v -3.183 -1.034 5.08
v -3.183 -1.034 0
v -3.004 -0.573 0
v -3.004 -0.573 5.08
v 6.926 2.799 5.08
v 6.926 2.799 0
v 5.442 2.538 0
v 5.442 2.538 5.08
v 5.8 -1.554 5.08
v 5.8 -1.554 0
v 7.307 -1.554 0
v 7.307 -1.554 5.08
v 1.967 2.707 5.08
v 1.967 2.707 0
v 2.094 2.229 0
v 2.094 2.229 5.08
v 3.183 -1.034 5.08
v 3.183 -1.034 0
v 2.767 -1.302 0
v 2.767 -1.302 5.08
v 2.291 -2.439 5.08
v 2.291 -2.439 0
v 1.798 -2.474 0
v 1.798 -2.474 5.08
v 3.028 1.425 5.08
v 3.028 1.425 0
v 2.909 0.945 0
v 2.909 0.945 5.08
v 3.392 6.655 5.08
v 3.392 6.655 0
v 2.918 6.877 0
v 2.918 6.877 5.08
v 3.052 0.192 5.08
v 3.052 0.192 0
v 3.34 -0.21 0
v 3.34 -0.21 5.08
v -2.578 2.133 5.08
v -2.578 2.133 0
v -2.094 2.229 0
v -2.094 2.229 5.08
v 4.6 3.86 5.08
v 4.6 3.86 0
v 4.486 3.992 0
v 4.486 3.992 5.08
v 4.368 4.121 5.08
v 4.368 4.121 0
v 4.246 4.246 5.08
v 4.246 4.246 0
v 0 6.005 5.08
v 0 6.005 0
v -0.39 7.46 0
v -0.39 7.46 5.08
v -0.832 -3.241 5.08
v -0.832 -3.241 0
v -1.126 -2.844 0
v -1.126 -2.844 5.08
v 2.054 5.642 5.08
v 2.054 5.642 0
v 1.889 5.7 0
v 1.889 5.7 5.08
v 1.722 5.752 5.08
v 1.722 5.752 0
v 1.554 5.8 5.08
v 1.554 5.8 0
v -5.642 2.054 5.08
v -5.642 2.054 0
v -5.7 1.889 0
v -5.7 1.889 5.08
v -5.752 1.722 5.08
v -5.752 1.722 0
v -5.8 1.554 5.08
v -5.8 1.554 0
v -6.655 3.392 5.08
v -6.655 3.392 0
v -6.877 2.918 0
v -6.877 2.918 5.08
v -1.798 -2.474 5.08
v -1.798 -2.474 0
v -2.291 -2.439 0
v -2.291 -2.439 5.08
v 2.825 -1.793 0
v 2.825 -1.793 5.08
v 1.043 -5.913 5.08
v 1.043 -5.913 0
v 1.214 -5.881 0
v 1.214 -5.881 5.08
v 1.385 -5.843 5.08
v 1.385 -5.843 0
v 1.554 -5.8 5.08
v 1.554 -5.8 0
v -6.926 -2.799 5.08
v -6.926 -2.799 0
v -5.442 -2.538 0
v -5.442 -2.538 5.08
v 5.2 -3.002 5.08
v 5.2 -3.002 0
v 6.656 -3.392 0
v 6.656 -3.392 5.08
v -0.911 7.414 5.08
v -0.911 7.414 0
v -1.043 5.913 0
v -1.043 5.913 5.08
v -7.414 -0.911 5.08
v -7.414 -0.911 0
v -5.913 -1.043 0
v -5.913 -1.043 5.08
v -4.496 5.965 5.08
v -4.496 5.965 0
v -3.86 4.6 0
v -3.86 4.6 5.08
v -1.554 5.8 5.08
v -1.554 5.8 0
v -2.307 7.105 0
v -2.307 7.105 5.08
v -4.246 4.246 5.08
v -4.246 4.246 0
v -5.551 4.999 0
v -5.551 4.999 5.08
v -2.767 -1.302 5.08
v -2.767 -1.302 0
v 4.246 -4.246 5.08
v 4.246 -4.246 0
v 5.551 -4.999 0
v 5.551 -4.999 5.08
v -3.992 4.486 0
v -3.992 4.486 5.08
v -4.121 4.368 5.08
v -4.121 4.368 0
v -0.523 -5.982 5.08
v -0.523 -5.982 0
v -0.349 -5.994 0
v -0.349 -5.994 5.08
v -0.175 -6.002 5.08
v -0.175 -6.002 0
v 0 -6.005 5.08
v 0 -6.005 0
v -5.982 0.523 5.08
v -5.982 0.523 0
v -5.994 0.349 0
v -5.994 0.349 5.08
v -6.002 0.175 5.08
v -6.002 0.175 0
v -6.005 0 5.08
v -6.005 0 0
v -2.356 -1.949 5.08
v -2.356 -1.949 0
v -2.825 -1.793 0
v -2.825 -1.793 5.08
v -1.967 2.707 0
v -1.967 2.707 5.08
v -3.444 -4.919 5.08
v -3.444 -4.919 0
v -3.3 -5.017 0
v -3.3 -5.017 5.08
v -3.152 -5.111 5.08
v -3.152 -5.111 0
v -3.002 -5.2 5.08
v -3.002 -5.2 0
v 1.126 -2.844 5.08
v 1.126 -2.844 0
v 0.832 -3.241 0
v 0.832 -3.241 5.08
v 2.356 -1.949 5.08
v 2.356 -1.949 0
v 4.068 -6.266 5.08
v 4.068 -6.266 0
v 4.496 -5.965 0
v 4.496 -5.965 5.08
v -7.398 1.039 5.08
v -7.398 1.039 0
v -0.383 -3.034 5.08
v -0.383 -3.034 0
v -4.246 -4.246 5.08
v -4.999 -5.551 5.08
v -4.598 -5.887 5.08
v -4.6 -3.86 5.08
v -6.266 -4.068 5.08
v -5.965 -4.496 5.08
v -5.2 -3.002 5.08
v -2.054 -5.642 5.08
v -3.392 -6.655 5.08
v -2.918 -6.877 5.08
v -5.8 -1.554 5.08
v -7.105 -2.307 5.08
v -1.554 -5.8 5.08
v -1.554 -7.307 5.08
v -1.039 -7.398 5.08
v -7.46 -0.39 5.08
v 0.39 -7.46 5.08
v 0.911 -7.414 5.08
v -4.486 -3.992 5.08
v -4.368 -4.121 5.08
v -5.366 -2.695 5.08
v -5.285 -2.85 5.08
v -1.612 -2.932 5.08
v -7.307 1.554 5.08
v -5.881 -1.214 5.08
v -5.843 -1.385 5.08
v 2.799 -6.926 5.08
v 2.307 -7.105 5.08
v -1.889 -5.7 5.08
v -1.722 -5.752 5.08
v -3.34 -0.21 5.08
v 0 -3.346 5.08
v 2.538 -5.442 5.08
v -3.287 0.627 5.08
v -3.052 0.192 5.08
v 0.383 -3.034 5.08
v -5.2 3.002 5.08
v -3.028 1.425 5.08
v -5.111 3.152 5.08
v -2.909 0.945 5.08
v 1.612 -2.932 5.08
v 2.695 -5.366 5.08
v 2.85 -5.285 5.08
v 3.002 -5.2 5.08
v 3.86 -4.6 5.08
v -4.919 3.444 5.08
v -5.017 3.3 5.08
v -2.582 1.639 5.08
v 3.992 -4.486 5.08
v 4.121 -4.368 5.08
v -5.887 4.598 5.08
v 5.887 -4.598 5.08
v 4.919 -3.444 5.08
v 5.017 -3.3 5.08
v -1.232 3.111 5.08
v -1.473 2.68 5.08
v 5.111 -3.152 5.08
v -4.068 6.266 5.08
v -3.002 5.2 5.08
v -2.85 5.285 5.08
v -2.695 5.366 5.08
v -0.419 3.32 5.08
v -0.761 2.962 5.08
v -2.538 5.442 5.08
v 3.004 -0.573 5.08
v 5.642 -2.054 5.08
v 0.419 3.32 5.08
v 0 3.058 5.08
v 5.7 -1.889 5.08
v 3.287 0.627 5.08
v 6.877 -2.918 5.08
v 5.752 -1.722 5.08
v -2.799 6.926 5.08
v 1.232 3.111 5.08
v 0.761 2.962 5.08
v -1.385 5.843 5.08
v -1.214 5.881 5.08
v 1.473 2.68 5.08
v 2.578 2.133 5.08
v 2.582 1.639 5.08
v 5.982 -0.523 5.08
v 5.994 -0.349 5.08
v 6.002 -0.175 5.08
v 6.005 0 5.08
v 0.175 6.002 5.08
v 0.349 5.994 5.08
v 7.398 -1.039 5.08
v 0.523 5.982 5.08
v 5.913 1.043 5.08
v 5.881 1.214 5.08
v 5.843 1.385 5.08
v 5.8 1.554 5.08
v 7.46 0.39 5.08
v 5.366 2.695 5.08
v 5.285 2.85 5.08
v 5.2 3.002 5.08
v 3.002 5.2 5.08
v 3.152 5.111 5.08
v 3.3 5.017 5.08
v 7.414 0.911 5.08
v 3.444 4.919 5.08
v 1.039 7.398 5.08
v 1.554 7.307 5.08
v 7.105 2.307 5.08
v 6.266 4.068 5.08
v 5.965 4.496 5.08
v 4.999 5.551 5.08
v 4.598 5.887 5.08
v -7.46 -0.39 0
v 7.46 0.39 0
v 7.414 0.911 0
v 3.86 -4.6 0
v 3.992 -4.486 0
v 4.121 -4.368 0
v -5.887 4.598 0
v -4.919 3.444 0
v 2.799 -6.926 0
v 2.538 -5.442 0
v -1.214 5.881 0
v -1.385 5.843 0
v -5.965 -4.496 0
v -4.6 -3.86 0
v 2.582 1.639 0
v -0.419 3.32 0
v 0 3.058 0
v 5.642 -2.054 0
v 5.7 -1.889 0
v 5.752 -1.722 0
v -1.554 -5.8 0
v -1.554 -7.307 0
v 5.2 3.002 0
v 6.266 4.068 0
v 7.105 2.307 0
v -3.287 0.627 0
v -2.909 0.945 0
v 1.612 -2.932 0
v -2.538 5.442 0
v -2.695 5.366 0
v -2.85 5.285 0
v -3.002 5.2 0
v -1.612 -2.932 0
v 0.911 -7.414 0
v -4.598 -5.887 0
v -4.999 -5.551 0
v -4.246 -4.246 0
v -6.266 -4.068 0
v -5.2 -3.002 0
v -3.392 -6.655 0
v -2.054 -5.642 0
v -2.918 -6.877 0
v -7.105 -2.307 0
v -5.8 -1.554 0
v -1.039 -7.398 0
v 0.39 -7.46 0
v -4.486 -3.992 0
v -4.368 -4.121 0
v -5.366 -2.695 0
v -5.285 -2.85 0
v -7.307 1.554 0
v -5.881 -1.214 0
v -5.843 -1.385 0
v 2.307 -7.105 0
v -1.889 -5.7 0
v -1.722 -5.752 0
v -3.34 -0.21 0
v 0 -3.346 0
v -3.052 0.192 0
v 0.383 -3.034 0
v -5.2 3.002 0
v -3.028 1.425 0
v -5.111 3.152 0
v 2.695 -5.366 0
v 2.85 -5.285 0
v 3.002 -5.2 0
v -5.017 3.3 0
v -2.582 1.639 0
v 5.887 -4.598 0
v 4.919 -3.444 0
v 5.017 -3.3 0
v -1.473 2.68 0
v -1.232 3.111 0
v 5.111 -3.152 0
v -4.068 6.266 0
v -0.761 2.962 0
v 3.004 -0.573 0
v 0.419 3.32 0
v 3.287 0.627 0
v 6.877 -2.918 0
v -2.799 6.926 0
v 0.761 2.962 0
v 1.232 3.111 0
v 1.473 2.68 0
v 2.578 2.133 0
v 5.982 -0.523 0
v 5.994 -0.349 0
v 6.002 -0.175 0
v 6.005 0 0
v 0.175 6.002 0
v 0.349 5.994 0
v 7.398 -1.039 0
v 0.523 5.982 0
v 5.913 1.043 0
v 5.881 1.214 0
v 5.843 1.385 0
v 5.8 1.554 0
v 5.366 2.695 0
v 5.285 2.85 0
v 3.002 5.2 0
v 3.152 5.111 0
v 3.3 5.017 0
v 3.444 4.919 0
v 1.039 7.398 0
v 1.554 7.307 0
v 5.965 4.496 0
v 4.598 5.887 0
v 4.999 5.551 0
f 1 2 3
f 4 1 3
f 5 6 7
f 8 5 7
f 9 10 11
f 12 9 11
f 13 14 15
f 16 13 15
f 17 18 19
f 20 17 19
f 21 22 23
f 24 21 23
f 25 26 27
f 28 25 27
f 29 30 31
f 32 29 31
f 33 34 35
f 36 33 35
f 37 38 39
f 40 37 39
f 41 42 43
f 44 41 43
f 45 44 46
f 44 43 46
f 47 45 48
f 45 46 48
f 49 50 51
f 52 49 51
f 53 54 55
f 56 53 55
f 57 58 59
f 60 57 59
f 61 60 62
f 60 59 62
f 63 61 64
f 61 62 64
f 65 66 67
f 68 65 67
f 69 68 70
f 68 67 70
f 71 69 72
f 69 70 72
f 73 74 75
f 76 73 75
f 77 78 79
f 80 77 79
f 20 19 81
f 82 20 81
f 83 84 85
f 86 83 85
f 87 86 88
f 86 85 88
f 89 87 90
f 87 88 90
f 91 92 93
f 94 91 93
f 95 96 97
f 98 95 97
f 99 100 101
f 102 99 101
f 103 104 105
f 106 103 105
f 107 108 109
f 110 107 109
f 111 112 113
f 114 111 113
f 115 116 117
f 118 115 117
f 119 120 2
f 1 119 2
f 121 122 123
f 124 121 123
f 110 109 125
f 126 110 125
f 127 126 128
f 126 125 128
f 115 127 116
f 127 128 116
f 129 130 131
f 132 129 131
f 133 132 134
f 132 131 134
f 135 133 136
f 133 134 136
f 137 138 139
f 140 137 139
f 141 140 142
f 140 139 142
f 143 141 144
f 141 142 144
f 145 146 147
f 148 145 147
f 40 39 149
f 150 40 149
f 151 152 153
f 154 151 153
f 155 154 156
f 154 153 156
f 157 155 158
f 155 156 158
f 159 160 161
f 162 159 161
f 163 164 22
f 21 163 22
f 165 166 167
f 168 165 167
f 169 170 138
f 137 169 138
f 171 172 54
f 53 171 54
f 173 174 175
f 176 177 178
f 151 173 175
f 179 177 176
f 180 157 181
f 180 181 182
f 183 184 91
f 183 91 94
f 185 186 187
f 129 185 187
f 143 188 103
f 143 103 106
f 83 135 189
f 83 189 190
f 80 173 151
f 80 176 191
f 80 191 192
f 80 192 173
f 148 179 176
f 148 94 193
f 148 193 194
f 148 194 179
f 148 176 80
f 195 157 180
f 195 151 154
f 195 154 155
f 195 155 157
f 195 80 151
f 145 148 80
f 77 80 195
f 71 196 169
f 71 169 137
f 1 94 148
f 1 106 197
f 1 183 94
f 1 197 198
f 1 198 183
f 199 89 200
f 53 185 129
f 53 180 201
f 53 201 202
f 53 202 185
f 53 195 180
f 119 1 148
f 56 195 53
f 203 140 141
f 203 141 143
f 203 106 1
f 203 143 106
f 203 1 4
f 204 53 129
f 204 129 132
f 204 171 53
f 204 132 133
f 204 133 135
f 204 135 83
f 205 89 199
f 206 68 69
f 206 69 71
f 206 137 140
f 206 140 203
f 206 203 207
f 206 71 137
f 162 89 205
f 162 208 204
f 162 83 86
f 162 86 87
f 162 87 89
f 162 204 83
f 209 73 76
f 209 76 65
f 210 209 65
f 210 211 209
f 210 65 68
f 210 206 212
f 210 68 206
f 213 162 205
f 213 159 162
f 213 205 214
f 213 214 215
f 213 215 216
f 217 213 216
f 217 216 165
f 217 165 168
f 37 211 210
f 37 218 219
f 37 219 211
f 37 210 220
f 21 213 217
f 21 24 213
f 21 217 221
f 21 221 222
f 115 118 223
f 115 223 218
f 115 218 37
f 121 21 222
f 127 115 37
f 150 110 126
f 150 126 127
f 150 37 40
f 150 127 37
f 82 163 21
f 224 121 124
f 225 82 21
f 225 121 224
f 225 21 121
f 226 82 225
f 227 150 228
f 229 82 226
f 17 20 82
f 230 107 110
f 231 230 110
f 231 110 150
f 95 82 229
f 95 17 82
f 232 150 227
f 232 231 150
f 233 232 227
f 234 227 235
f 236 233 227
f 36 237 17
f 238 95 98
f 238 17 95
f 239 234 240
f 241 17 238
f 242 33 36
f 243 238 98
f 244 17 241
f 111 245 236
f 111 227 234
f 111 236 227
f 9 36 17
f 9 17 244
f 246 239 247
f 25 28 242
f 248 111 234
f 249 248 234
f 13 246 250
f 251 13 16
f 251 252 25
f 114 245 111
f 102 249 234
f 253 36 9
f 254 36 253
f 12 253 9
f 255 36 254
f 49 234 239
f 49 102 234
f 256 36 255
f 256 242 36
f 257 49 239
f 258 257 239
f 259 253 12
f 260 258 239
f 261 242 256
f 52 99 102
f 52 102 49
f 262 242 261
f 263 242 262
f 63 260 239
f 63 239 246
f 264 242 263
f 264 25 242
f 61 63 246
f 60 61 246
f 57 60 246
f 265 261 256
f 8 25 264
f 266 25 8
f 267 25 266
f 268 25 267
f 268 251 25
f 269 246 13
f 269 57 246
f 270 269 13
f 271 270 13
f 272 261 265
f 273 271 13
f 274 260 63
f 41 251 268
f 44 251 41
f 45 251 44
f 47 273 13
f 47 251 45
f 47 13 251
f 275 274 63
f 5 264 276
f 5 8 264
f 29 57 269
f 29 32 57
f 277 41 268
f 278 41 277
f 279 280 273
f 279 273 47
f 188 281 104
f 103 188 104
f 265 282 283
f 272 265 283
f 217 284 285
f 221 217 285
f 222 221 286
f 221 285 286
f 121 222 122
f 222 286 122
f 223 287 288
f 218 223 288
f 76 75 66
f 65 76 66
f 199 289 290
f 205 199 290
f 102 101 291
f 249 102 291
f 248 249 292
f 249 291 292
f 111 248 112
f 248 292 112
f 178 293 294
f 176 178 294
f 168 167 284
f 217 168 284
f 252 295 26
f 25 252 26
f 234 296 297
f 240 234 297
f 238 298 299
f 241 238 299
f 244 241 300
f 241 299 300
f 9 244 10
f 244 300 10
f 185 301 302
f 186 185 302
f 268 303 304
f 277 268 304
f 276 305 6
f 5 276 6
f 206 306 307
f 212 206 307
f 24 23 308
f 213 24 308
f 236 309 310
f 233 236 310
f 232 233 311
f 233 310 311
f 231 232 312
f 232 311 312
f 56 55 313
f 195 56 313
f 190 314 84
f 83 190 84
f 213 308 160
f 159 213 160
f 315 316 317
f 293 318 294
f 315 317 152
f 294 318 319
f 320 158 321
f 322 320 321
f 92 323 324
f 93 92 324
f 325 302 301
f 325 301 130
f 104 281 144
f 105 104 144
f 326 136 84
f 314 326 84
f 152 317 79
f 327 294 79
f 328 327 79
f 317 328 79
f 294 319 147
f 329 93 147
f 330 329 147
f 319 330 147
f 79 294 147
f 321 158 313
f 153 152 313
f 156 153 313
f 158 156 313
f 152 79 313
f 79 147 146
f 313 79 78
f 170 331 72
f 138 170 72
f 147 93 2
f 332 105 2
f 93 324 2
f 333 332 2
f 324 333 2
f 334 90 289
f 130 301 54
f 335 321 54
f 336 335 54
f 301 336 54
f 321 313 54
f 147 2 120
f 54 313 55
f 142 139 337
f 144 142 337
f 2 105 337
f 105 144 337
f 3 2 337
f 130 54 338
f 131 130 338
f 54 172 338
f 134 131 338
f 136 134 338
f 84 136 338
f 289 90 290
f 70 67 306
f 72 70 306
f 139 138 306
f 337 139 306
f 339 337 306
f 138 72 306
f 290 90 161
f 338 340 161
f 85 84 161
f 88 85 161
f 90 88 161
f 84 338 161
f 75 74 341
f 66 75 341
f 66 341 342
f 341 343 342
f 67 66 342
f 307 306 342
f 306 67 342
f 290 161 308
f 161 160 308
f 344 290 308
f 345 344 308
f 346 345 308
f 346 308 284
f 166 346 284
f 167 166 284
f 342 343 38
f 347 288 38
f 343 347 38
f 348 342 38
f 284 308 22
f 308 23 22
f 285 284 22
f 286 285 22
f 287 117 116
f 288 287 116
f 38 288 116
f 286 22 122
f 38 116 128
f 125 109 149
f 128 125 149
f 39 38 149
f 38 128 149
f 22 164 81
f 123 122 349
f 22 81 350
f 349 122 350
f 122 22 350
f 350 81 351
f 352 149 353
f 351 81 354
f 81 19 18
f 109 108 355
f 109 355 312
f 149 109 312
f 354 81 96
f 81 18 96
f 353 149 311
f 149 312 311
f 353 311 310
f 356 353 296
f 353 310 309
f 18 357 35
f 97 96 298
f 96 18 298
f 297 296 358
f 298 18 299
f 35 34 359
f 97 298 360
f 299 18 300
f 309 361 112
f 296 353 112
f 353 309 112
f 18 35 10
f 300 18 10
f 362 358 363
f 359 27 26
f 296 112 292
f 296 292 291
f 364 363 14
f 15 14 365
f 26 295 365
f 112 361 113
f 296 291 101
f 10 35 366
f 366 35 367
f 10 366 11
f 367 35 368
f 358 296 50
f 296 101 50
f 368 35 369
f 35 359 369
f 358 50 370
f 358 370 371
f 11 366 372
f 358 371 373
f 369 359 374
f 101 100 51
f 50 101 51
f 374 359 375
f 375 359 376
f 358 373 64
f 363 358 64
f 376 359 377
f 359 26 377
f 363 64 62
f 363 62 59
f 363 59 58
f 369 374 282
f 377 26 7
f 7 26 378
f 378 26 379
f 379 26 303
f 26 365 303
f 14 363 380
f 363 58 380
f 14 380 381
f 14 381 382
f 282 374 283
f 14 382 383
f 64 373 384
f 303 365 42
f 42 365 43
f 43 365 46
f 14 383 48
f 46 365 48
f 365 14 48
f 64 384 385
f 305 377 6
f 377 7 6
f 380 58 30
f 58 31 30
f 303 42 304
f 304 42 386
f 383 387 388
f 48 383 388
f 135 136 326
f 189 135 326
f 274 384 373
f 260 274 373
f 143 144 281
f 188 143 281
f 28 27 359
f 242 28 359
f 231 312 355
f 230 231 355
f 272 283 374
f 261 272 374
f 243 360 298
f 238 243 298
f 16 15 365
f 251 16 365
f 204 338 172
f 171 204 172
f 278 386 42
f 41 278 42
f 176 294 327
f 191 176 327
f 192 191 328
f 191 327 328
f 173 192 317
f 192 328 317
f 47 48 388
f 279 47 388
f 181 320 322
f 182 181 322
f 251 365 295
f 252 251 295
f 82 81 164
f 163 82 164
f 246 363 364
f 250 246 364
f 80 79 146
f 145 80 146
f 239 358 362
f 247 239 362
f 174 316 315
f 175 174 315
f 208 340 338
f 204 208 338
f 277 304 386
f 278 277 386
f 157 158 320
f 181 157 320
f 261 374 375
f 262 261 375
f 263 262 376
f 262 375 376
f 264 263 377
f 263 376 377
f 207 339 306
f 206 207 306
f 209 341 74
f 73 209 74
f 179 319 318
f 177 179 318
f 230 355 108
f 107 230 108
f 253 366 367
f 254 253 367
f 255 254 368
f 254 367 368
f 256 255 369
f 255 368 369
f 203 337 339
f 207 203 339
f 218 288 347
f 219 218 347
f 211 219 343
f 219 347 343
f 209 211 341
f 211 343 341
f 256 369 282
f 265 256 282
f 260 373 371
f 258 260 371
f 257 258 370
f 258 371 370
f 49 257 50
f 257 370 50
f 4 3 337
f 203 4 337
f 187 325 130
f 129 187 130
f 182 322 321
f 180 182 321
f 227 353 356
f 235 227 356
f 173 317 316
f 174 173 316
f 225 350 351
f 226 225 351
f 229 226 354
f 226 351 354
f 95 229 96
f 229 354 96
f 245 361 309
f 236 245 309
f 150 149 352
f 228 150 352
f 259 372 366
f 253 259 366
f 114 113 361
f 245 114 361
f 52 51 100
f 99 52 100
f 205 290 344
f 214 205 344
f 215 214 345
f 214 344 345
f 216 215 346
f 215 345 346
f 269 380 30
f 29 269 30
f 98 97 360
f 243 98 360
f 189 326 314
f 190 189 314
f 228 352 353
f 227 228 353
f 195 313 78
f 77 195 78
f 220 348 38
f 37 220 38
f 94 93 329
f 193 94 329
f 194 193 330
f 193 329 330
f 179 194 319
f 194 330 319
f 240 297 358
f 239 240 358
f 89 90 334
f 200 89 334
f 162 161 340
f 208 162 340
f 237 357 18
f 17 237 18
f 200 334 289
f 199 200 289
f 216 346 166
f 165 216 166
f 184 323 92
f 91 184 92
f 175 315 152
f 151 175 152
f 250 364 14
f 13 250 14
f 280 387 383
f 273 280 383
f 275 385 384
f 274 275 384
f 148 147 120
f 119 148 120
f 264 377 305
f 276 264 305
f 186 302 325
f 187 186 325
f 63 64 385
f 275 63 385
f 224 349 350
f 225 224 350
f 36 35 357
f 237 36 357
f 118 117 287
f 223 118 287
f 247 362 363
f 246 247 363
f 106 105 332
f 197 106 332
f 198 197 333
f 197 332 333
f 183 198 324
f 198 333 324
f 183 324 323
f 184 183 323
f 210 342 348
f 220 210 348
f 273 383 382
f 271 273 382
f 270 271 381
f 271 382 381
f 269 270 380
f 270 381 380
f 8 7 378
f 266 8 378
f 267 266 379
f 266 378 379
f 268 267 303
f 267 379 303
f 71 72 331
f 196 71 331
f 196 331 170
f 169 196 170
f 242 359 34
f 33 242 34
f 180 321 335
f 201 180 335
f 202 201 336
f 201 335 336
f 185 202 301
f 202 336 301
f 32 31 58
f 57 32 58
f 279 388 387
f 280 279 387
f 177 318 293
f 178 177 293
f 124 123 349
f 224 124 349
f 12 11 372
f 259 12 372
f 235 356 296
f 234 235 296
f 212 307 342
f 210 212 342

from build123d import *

# Parameters (mm, degrees)
F1_DEPTH = 5.08


# Not quite as in the source:
# - ends of sketch curves that miss each other by under 0.0002 mm in the source are joined


with BuildPart() as f1:
    # F0 (on Top) → F1 (new body)
    with BuildSketch(Plane.XY):
        with BuildLine():
            Line((1.0386822, 7.3975722), (0.5233416, 5.9817))
            ThreePointArc((0.5233416, 5.9817), (0.261920534, 5.9988447577), (0, 6.00456))
            Line((0, 6.00456), (-0.3899662, 7.4599546))
            Line((-0.3899662, 7.4599546), (-0.911352, 7.4143362))
            Line((-0.911352, 7.4143362), (-1.04267, 5.9133486))
            ThreePointArc((-1.04267, 5.9133486), (-1.2996201412, 5.8622289517), (-1.5540978425, 5.79995868))
            Line((-1.5540978425, 5.79995868), (-2.307463, 7.1048372))
            Line((-2.307463, 7.1048372), (-2.7992832, 6.925818))
            Line((-2.7992832, 6.925818), (-2.5376378, 5.4419754))
            ThreePointArc((-2.5376378, 5.4419754), (-2.7726007409, 5.3261079528), (-3.0022844594, 5.2000989239))
            Line((-3.0022844594, 5.2000989239), (-4.0677084, 6.2655196))
            Line((-4.0677084, 6.2655196), (-4.496435, 5.965317))
            Line((-4.496435, 5.965317), (-3.859657, 4.5997622))
            ThreePointArc((-3.859657, 4.5997622), (-4.0566214385, 4.4270264624), (-4.245865094, 4.245865094))
            Line((-4.245865094, 4.245865094), (-5.5507382, 4.999228))
            Line((-5.5507382, 4.999228), (-5.8871612, 4.598289))
            Line((-5.8871612, 4.598289), (-4.9186338, 3.4440622))
            ThreePointArc((-4.9186338, 3.4440622), (-5.0641936548, 3.2262491255), (-5.2000989239, 3.0022844594))
            Line((-5.2000989239, 3.0022844594), (-6.6554858, 3.3922462))
            Line((-6.6554858, 3.3922462), (-6.876669, 2.9179012))
            Line((-6.876669, 2.9179012), (-5.6424322, 2.0536916))
            ThreePointArc((-5.6424322, 2.0536916), (-5.7266481207, 1.8056140494), (-5.79995868, 1.5540978425))
            Line((-5.79995868, 1.5540978425), (-7.306691, 1.554099))
            Line((-7.306691, 1.554099), (-7.3975722, 1.0386568))
            Line((-7.3975722, 1.0386568), (-5.9817, 0.5233416))
            ThreePointArc((-5.9817, 0.5233416), (-5.9988447577, 0.261920534), (-6.00456, 0))
            Line((-6.00456, 0), (-7.4599546, -0.3899662))
            Line((-7.4599546, -0.3899662), (-7.4143362, -0.911352))
            Line((-7.4143362, -0.911352), (-5.9133232, -1.04267))
            ThreePointArc((-5.9133232, -1.04267), (-5.8622284744, -1.2996222942), (-5.79995868, -1.5540978425))
            Line((-5.79995868, -1.5540978425), (-7.1048372, -2.307463))
            Line((-7.1048372, -2.307463), (-6.925818, -2.7992832))
            Line((-6.925818, -2.7992832), (-5.4419754, -2.5376378))
            ThreePointArc((-5.4419754, -2.5376378), (-5.3261079528, -2.7726007409), (-5.2000989239, -3.0022844594))
            Line((-5.2000989239, -3.0022844594), (-6.2655196, -4.0677084))
            Line((-6.2655196, -4.0677084), (-5.965317, -4.496435))
            Line((-5.965317, -4.496435), (-4.5997622, -3.859657))
            ThreePointArc((-4.5997622, -3.859657), (-4.4270264624, -4.0566214385), (-4.245865094, -4.245865094))
            Line((-4.245865094, -4.245865094), (-4.999228, -5.5507382))
            Line((-4.999228, -5.5507382), (-4.598289, -5.8871612))
            Line((-4.598289, -5.8871612), (-3.4440622, -4.9186592))
            ThreePointArc((-3.4440622, -4.9186592), (-3.2262429819, -5.0641975688), (-3.0022844594, -5.2000989239))
            Line((-3.0022844594, -5.2000989239), (-3.3922462, -6.6554858))
            Line((-3.3922462, -6.6554858), (-2.9179012, -6.8766944))
            Line((-2.9179012, -6.8766944), (-2.0536662, -5.6424322))
            ThreePointArc((-2.0536662, -5.6424322), (-1.8056026676, -5.7266517094), (-1.5540978425, -5.79995868))
            Line((-1.5540978425, -5.79995868), (-1.554099, -7.306691))
            Line((-1.554099, -7.306691), (-1.0386568, -7.3975722))
            Line((-1.0386568, -7.3975722), (-0.5233162, -5.9817))
            ThreePointArc((-0.5233162, -5.9817), (-0.2619078943, -5.9988453096), (0, -6.00456))
            Line((0, -6.00456), (0.3899662, -7.4599546))
            Line((0.3899662, -7.4599546), (0.9113774, -7.4143362))
            Line((0.9113774, -7.4143362), (1.0426954, -5.9133486))
            ThreePointArc((1.0426954, -5.9133486), (1.2996323518, -5.8622262447), (1.5540978425, -5.79995868))
            Line((1.5540978425, -5.79995868), (2.307463, -7.1048372))
            Line((2.307463, -7.1048372), (2.7992832, -6.925818))
            Line((2.7992832, -6.925818), (2.5376378, -5.4419754))
            ThreePointArc((2.5376378, -5.4419754), (2.7726007409, -5.3261079528), (3.0022844594, -5.2000989239))
            Line((3.0022844594, -5.2000989239), (4.0677084, -6.2655196))
            Line((4.0677084, -6.2655196), (4.496435, -5.965317))
            Line((4.496435, -5.965317), (3.859657, -4.5997622))
            ThreePointArc((3.859657, -4.5997622), (4.0566214385, -4.4270264624), (4.245865094, -4.245865094))
            Line((4.245865094, -4.245865094), (5.5507382, -4.999228))
            Line((5.5507382, -4.999228), (5.8871612, -4.598289))
            Line((5.8871612, -4.598289), (4.9186592, -3.4440622))
            ThreePointArc((4.9186592, -3.4440622), (5.0642009806, -3.2262376264), (5.2001052739, -3.0022734609))
            Line((5.2001052739, -3.0022734609), (6.6555112, -3.3922462))
            Line((6.6555112, -3.3922462), (6.8766944, -2.9179012))
            Line((6.8766944, -2.9179012), (5.6424576, -2.0536916))
            ThreePointArc((5.6424576, -2.0536916), (5.7266494269, -1.8056099067), (5.79995868, -1.5540978425))
            Line((5.79995868, -1.5540978425), (7.306691, -1.554099))
            Line((7.306691, -1.554099), (7.3975722, -1.0386568))
            Line((7.3975722, -1.0386568), (5.9817254, -0.5233416))
            ThreePointArc((5.9817254, -0.5233416), (5.998844806, -0.2619194281), (6.00456, 0))
            Line((6.00456, 0), (7.4599546, 0.3899662))
            Line((7.4599546, 0.3899662), (7.4143362, 0.911352))
            Line((7.4143362, 0.911352), (5.9133486, 1.04267))
            ThreePointArc((5.9133486, 1.04267), (5.8622289517, 1.2996201412), (5.79995868, 1.5540978425))
            Line((5.79995868, 1.5540978425), (7.1048372, 2.307463))
            Line((7.1048372, 2.307463), (6.925818, 2.7992832))
            Line((6.925818, 2.7992832), (5.4419754, 2.5376378))
            ThreePointArc((5.4419754, 2.5376378), (5.3261108849, 2.7725951084), (5.2001052739, 3.0022734609))
            Line((5.2001052739, 3.0022734609), (6.2655196, 4.0677084))
            Line((6.2655196, 4.0677084), (5.9653424, 4.496435))
            Line((5.9653424, 4.496435), (4.5997622, 3.859657))
            ThreePointArc((4.5997622, 3.859657), (4.4270264624, 4.0566214385), (4.245865094, 4.245865094))
            Line((4.245865094, 4.245865094), (4.999228, 5.5507382))
            Line((4.999228, 5.5507382), (4.5983144, 5.8871612))
            Line((4.5983144, 5.8871612), (3.4440876, 4.9186592))
            ThreePointArc((3.4440876, 4.9186592), (3.2262517559, 5.0641919791), (3.0022844594, 5.2000989239))
            Line((3.0022844594, 5.2000989239), (3.3922462, 6.6554858))
            Line((3.3922462, 6.6554858), (2.9179012, 6.8766944))
            Line((2.9179012, 6.8766944), (2.0536916, 5.6424322))
            ThreePointArc((2.0536916, 5.6424322), (1.8056140494, 5.7266481207), (1.5540978425, 5.79995868))
            Line((1.5540978425, 5.79995868), (1.554099, 7.306691))
            Line((1.554099, 7.306691), (1.0386822, 7.3975722))
        make_face()
        Polygon((-1.2318492, 3.1113222), (-0.7605522, 2.9622242), (-0.4194048, 3.319907), (0, 3.0583124), (0.4194048, 3.319907), (0.7605776, 2.9622242), (1.2318492, 3.1113222), (1.4733524, 2.6800048), (1.9668998, 2.7072082), (2.0935442, 2.2294088), (2.5783794, 2.1330158), (2.5822148, 1.6387318), (3.0278324, 1.4247876), (2.9086302, 0.9450578), (3.2870394, 0.6270244), (3.0522672, 0.192024), (3.3396936, -0.2101088), (3.0041342, -0.5730748), (3.1825184, -1.0340594), (2.7672284, -1.3021564), (2.825369, -1.7930368), (2.3564596, -1.9494246), (2.290699, -2.4393398), (1.7976342, -2.474214), (1.6120872, -2.9323792), (1.1258296, -2.84353), (0.8322056, -3.241167), (0.3833114, -3.0341824), (0, -3.3462976), (-0.3833114, -3.0341824), (-0.8321802, -3.241167), (-1.1258296, -2.84353), (-1.6120872, -2.9323792), (-1.7976088, -2.474214), (-2.290699, -2.4393398), (-2.3564596, -1.9494246), (-2.825369, -1.7930368), (-2.7672284, -1.3021564), (-3.1825184, -1.0340594), (-3.0041342, -0.5730748), (-3.3396936, -0.2101088), (-3.0522672, 0.192024), (-3.287014, 0.6270244), (-2.9086048, 0.9450578), (-3.027807, 1.4247876), (-2.5822148, 1.6387318), (-2.578354, 2.1330158), (-2.0935442, 2.2294088), (-1.9668998, 2.7072082), (-1.4733524, 2.6800048), align=None, mode=Mode.SUBTRACT)
    extrude(amount=F1_DEPTH)


solid = f1.part
